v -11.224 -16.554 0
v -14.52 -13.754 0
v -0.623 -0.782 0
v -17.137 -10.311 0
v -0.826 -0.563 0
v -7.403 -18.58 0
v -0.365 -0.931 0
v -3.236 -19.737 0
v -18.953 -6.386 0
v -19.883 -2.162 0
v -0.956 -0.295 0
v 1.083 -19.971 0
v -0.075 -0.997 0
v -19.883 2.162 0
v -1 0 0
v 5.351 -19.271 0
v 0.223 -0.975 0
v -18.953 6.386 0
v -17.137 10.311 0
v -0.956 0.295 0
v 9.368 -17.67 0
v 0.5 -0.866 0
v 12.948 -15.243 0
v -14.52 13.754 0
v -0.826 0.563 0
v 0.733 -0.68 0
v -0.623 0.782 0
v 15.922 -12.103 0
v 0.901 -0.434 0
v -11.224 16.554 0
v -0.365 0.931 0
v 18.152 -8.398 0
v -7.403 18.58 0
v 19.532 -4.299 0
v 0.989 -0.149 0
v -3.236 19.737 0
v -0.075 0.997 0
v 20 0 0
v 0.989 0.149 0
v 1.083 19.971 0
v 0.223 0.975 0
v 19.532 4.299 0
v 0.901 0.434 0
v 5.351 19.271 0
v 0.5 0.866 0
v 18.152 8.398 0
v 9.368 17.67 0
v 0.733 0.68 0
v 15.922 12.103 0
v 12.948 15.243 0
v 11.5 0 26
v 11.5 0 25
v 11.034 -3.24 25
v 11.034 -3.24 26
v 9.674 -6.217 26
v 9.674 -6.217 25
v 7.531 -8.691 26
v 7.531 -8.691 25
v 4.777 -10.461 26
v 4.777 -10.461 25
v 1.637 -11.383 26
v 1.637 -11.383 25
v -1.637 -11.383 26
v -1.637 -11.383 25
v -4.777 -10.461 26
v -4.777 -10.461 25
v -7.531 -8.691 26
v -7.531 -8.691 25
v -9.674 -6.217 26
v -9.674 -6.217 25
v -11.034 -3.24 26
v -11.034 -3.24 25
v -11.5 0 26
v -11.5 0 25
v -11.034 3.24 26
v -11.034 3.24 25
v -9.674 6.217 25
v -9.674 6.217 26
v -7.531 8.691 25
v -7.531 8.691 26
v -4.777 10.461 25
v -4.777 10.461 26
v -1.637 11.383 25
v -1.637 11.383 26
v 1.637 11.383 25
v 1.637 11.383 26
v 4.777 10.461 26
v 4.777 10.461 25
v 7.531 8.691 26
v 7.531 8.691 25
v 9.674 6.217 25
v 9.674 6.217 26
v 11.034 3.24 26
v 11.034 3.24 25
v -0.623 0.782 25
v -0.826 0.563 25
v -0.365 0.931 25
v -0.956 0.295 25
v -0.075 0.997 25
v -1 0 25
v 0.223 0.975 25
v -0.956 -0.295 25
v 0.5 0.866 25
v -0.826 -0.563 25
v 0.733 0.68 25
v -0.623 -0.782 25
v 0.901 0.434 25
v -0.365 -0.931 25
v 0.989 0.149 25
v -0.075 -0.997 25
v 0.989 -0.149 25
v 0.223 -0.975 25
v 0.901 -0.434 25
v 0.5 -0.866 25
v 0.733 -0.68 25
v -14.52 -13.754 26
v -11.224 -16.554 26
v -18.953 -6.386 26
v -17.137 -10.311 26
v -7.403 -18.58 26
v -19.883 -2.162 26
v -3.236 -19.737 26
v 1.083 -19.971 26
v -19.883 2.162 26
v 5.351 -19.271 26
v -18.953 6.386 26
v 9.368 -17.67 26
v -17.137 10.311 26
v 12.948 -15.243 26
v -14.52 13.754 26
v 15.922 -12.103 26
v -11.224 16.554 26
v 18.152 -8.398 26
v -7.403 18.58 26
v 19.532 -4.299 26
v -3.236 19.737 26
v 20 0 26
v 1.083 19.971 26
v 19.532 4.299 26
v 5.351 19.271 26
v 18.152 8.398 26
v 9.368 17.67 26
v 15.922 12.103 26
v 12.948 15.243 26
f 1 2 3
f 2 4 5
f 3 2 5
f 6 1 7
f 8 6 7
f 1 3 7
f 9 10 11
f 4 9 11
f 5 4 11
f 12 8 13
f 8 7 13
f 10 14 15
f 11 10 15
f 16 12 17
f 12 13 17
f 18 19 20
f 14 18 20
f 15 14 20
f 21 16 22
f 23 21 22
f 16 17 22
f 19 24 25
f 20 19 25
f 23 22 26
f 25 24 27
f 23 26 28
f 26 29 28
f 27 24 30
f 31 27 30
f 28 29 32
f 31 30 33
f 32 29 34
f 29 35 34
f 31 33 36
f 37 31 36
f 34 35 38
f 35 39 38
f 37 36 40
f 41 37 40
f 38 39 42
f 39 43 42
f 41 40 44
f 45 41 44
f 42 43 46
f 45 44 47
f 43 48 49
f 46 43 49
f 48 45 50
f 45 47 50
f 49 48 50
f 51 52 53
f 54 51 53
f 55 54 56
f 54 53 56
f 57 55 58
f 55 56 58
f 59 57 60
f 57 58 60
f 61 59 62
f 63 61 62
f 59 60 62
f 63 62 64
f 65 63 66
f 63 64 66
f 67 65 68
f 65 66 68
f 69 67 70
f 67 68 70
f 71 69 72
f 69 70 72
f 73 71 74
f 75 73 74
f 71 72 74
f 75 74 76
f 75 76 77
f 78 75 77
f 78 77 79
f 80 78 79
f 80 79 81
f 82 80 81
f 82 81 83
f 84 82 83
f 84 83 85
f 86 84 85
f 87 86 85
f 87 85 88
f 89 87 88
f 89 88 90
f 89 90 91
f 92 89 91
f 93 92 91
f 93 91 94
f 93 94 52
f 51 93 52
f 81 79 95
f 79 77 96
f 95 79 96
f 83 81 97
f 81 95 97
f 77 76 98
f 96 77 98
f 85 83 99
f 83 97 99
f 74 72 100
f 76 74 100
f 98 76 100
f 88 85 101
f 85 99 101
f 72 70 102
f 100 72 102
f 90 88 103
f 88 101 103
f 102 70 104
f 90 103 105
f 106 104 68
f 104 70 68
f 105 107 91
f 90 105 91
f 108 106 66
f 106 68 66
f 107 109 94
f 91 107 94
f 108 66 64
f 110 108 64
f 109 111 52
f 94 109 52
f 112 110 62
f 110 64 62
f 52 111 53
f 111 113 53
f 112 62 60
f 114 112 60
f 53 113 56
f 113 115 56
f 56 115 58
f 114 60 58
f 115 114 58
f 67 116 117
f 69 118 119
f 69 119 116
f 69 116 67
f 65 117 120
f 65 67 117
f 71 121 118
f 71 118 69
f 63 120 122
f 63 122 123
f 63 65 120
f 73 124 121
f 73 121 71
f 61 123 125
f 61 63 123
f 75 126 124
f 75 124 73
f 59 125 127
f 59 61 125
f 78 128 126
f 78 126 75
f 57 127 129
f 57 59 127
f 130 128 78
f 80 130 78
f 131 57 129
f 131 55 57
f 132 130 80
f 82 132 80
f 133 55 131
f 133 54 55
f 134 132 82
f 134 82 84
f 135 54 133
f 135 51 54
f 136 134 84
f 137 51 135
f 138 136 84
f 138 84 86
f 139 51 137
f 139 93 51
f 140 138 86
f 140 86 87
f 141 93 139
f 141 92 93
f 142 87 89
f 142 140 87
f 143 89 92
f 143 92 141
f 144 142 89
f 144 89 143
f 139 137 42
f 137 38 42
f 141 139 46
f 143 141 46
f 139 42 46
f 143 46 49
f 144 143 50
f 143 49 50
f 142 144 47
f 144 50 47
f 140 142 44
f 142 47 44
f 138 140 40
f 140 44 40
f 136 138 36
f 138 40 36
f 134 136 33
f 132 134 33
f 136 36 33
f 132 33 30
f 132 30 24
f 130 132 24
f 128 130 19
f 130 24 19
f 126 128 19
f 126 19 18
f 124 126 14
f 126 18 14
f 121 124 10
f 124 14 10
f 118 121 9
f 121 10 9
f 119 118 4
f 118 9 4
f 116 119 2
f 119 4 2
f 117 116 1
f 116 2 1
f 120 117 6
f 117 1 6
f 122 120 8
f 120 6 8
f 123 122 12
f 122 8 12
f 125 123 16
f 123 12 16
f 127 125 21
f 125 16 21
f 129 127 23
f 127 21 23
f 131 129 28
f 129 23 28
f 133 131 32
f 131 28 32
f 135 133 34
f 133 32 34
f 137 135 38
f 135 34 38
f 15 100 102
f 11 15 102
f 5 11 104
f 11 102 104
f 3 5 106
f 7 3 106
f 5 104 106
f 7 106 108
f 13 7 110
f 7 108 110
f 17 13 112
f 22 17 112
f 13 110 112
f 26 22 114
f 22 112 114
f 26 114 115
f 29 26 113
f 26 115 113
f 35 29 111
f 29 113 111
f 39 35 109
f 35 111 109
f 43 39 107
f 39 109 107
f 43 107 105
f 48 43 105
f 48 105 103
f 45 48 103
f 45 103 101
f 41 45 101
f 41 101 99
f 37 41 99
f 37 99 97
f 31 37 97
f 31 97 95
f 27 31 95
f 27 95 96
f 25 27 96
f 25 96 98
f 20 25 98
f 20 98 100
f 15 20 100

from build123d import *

# Parameters (mm, degrees)
F0_R     = 20
F1_DEPTH = 25
F2_D     = 2
F2_DEPTH = 27
F2_TIP   = 0.600860619
F3_R     = 20
F4_DEPTH = 1
F5_D     = 23
F5_DEPTH = 4
F5_TIP   = 6.9098971188


with BuildPart() as f1:
    # F0 (on Top) → F1 (new body)
    with BuildSketch(Plane.XY):
        Circle(F0_R)
    extrude(amount=F1_DEPTH)

    # F2
    with Locations(Plane(origin=(0, 0, 0), x_dir=(1, 0, 0), z_dir=(0, 0, -1))):
        with Locations((0, 0)):
            Hole(F2_D / 2, depth=F2_DEPTH)
            with Locations((0, 0, -(F2_DEPTH + F2_TIP / 2))):  # 118° drill point
                Cone(0, F2_D / 2, F2_TIP, mode=Mode.SUBTRACT)

    # F3 (on face) → F4 (join)
    with BuildSketch(Plane.XY.offset(25)):
        Circle(F3_R)
    extrude(amount=F4_DEPTH)

    # F5 (one way)
    with BuildSketch(Plane(origin=(0, 0, 25), x_dir=(1, 0, 0), z_dir=(0, 0, -1))):
        with Locations((0, 0)):
            Circle(F5_D / 2)
    extrude(amount=-F5_DEPTH, mode=Mode.SUBTRACT)
    with Locations(Plane(origin=(0, 0, 25), x_dir=(1, 0, 0), z_dir=(0, 0, -1))):
        with Locations((0, 0)):
            with Locations((0, 0, -(F5_DEPTH + F5_TIP / 2))):  # 118° drill point
                Cone(0, F5_D / 2, F5_TIP, mode=Mode.SUBTRACT)


solid = f1.part
